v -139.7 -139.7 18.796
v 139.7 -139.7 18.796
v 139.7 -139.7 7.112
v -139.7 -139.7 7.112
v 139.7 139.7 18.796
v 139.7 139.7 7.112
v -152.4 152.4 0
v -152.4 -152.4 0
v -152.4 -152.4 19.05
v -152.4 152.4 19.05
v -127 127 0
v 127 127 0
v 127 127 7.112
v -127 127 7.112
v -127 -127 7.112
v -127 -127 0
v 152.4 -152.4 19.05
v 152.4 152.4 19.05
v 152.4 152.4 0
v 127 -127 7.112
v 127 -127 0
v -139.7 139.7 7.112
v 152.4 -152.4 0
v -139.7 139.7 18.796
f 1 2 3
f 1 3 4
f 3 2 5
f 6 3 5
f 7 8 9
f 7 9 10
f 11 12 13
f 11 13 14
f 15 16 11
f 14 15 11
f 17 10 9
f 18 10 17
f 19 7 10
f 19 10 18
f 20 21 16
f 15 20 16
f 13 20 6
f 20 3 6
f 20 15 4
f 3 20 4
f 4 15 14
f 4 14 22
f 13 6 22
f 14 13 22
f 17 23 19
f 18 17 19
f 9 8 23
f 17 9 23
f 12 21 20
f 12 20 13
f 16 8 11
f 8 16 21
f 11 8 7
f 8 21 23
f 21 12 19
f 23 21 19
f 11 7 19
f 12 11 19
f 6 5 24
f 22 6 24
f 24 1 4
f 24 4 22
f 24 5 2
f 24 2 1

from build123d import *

# Parameters (mm, degrees)
SKETCH1_W           = 304.8
SKETCH1_H           = 304.8
BOSS_EXTRUDE1_DEPTH = 19.05
SKETCH2_W           = 254
SKETCH2_H           = 254
CUT_EXTRUDE1_DEPTH  = 18.796
SKETCH3_W           = 279.4
SKETCH3_H           = 279.4
CUT_EXTRUDE2_DEPTH  = 11.684


with BuildPart() as part:
    # Sketch1 → Boss-Extrude1 (new body)
    with BuildSketch(Plane.XY):
        Rectangle(SKETCH1_W, SKETCH1_H)
    extrude(amount=BOSS_EXTRUDE1_DEPTH)

    # Sketch2 → Cut-Extrude1 (cut)
    with BuildSketch(Plane(origin=(0, 0, 0), x_dir=(-1, 0, 0), z_dir=(0, 0, -1))):
        Rectangle(SKETCH2_W, SKETCH2_H)
    extrude(amount=-CUT_EXTRUDE1_DEPTH, mode=Mode.SUBTRACT)

    # Sketch3 → Cut-Extrude2 (cut)
    with BuildSketch(Plane(origin=(0, 0, 18.796), x_dir=(-1, 0, 0), z_dir=(0, 0, -1))):
        Rectangle(SKETCH3_W, SKETCH3_H)
    extrude(amount=CUT_EXTRUDE2_DEPTH, mode=Mode.SUBTRACT)


solid = part.part
